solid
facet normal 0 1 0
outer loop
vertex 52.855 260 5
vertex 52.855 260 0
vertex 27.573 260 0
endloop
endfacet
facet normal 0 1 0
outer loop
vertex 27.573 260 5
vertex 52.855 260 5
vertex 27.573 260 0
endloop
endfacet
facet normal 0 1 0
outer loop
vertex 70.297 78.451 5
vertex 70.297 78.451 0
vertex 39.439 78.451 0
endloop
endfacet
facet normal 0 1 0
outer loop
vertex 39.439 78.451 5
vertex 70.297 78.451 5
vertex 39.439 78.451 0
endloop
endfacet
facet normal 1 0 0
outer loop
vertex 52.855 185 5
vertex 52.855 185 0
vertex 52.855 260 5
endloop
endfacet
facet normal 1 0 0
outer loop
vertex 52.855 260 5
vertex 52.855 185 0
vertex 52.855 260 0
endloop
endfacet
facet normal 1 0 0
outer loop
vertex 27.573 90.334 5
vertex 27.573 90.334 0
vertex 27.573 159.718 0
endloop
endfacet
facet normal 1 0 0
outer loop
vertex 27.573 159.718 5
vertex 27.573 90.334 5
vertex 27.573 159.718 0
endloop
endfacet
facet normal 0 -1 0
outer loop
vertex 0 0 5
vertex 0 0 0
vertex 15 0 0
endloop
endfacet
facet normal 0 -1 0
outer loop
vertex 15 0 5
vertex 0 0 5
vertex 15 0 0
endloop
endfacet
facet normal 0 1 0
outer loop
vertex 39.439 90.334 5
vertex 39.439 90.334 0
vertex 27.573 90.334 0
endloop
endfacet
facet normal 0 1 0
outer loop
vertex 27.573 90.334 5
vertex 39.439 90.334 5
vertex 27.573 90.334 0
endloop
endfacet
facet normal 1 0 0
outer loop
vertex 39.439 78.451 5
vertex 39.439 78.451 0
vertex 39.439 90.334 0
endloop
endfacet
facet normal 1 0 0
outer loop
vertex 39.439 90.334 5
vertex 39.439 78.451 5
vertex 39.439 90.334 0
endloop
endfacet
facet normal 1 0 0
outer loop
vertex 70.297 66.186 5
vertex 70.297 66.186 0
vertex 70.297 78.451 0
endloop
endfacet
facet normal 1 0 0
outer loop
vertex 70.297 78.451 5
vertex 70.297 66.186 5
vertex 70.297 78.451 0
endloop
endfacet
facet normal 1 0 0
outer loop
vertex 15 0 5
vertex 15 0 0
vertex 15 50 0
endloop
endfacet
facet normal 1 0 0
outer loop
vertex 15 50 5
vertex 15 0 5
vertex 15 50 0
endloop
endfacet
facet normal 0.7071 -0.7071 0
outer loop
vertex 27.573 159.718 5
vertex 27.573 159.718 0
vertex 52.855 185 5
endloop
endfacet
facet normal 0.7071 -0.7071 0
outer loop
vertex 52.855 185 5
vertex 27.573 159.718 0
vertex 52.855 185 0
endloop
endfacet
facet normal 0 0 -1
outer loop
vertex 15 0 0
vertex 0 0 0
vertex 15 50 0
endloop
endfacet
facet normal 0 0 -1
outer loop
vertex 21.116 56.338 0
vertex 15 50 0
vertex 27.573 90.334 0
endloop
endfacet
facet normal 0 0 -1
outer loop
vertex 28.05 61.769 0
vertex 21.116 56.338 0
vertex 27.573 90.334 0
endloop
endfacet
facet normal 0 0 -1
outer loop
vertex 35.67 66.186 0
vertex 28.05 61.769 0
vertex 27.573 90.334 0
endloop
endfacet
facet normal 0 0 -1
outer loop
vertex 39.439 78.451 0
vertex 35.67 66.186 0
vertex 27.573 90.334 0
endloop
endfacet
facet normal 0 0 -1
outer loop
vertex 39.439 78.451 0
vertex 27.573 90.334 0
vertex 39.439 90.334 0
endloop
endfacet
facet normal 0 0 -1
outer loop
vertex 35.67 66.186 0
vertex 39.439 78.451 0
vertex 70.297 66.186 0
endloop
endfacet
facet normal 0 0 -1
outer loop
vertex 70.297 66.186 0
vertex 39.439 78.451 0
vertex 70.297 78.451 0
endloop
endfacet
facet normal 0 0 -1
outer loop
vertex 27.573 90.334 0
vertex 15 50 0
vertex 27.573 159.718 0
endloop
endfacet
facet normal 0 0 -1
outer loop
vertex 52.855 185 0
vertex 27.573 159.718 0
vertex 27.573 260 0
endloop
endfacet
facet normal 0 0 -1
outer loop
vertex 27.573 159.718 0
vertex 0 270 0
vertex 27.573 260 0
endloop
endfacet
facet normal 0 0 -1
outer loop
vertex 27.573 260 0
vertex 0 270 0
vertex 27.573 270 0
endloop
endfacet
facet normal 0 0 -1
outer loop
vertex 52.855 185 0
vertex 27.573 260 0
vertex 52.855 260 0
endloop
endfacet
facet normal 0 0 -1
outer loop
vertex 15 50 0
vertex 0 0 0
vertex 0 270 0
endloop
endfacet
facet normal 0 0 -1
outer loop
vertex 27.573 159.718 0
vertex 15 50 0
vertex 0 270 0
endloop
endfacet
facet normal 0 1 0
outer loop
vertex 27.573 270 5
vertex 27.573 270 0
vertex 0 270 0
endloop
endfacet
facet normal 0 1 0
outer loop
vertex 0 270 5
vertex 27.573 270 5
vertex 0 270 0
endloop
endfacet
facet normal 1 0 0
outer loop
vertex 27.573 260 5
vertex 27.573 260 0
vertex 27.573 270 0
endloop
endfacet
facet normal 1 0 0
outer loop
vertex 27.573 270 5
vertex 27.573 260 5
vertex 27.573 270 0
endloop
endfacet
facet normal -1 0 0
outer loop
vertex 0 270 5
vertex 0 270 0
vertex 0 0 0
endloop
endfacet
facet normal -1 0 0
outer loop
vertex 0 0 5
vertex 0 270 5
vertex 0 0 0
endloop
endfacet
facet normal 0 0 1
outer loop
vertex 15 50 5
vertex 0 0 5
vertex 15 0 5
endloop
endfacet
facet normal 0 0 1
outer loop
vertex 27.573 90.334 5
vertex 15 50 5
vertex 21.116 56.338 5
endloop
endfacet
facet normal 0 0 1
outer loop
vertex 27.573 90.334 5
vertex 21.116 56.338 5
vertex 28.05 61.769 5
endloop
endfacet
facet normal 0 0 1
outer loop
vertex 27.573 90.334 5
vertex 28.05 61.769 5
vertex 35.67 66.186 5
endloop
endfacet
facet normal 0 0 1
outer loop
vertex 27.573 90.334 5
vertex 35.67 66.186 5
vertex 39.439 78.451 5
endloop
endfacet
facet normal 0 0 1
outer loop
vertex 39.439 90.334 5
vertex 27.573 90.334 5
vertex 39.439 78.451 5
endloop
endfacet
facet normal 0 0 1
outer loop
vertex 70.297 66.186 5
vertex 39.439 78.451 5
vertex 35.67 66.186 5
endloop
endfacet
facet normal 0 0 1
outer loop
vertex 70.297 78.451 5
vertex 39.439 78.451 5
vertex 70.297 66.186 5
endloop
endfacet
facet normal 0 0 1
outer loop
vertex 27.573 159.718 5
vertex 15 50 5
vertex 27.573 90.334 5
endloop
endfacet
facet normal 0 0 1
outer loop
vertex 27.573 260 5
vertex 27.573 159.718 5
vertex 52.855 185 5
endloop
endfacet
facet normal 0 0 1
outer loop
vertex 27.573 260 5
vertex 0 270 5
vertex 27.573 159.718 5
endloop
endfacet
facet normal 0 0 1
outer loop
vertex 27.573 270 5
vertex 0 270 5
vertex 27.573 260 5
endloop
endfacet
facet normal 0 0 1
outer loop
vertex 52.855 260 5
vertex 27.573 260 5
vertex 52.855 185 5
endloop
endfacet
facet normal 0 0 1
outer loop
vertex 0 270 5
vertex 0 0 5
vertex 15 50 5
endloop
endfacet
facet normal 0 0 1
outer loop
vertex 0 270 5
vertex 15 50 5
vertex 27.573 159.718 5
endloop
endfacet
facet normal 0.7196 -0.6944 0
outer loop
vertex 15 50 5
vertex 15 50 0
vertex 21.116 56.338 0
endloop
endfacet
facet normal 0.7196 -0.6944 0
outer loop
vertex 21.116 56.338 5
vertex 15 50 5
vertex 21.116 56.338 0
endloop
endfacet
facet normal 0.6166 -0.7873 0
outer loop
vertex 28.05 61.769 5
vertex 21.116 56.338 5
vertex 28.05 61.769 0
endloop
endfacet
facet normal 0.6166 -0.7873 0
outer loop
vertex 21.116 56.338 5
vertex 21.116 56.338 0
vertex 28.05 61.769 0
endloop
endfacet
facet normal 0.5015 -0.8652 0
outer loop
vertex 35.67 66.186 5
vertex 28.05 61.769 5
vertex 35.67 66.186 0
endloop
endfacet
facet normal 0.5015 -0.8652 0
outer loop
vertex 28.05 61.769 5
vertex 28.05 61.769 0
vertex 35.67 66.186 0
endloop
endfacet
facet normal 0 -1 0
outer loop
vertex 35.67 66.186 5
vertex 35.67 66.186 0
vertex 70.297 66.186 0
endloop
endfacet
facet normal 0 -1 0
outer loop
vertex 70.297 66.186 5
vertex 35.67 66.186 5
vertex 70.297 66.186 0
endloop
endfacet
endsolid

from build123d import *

# Parameters (mm, degrees)
BOSS_EXTRU_1_DEPTH = 5


with BuildPart() as part:
    # Esquisse1 → Boss.-Extru.1 (new body)
    with BuildSketch(Plane.XY):
        with BuildLine():
            Line((70.297192809, 66.186397284), (70.297192809, 78.451204868))
            Line((70.297192809, 78.451204868), (39.439293445, 78.451204868))
            Line((39.439293445, 78.451204868), (39.439293445, 90.333987182))
            Line((39.439293445, 90.333987182), (27.572537656, 90.333987182))
            Line((27.572537656, 90.333987182), (27.572537656, 159.717501023))
            Line((27.572537656, 159.717501023), (52.855036633, 185))
            Line((52.855036633, 185), (52.855036633, 260))
            Line((52.855036633, 260), (27.572537656, 260))
            Line((27.572537656, 260), (27.572537656, 270))
            Line((27.572537656, 270), (0, 270))
            Line((0, 270), (0, 0))
            Line((0, 0), (15, 0))
            Line((15, 0), (15, 50))
            ThreePointArc((15, 50), (24.488558001, 59.174106779), (35.670004688, 66.186397284))
            Line((35.670004688, 66.186397284), (70.297192809, 66.186397284))
        make_face()
    extrude(amount=BOSS_EXTRU_1_DEPTH)


solid = part.part
